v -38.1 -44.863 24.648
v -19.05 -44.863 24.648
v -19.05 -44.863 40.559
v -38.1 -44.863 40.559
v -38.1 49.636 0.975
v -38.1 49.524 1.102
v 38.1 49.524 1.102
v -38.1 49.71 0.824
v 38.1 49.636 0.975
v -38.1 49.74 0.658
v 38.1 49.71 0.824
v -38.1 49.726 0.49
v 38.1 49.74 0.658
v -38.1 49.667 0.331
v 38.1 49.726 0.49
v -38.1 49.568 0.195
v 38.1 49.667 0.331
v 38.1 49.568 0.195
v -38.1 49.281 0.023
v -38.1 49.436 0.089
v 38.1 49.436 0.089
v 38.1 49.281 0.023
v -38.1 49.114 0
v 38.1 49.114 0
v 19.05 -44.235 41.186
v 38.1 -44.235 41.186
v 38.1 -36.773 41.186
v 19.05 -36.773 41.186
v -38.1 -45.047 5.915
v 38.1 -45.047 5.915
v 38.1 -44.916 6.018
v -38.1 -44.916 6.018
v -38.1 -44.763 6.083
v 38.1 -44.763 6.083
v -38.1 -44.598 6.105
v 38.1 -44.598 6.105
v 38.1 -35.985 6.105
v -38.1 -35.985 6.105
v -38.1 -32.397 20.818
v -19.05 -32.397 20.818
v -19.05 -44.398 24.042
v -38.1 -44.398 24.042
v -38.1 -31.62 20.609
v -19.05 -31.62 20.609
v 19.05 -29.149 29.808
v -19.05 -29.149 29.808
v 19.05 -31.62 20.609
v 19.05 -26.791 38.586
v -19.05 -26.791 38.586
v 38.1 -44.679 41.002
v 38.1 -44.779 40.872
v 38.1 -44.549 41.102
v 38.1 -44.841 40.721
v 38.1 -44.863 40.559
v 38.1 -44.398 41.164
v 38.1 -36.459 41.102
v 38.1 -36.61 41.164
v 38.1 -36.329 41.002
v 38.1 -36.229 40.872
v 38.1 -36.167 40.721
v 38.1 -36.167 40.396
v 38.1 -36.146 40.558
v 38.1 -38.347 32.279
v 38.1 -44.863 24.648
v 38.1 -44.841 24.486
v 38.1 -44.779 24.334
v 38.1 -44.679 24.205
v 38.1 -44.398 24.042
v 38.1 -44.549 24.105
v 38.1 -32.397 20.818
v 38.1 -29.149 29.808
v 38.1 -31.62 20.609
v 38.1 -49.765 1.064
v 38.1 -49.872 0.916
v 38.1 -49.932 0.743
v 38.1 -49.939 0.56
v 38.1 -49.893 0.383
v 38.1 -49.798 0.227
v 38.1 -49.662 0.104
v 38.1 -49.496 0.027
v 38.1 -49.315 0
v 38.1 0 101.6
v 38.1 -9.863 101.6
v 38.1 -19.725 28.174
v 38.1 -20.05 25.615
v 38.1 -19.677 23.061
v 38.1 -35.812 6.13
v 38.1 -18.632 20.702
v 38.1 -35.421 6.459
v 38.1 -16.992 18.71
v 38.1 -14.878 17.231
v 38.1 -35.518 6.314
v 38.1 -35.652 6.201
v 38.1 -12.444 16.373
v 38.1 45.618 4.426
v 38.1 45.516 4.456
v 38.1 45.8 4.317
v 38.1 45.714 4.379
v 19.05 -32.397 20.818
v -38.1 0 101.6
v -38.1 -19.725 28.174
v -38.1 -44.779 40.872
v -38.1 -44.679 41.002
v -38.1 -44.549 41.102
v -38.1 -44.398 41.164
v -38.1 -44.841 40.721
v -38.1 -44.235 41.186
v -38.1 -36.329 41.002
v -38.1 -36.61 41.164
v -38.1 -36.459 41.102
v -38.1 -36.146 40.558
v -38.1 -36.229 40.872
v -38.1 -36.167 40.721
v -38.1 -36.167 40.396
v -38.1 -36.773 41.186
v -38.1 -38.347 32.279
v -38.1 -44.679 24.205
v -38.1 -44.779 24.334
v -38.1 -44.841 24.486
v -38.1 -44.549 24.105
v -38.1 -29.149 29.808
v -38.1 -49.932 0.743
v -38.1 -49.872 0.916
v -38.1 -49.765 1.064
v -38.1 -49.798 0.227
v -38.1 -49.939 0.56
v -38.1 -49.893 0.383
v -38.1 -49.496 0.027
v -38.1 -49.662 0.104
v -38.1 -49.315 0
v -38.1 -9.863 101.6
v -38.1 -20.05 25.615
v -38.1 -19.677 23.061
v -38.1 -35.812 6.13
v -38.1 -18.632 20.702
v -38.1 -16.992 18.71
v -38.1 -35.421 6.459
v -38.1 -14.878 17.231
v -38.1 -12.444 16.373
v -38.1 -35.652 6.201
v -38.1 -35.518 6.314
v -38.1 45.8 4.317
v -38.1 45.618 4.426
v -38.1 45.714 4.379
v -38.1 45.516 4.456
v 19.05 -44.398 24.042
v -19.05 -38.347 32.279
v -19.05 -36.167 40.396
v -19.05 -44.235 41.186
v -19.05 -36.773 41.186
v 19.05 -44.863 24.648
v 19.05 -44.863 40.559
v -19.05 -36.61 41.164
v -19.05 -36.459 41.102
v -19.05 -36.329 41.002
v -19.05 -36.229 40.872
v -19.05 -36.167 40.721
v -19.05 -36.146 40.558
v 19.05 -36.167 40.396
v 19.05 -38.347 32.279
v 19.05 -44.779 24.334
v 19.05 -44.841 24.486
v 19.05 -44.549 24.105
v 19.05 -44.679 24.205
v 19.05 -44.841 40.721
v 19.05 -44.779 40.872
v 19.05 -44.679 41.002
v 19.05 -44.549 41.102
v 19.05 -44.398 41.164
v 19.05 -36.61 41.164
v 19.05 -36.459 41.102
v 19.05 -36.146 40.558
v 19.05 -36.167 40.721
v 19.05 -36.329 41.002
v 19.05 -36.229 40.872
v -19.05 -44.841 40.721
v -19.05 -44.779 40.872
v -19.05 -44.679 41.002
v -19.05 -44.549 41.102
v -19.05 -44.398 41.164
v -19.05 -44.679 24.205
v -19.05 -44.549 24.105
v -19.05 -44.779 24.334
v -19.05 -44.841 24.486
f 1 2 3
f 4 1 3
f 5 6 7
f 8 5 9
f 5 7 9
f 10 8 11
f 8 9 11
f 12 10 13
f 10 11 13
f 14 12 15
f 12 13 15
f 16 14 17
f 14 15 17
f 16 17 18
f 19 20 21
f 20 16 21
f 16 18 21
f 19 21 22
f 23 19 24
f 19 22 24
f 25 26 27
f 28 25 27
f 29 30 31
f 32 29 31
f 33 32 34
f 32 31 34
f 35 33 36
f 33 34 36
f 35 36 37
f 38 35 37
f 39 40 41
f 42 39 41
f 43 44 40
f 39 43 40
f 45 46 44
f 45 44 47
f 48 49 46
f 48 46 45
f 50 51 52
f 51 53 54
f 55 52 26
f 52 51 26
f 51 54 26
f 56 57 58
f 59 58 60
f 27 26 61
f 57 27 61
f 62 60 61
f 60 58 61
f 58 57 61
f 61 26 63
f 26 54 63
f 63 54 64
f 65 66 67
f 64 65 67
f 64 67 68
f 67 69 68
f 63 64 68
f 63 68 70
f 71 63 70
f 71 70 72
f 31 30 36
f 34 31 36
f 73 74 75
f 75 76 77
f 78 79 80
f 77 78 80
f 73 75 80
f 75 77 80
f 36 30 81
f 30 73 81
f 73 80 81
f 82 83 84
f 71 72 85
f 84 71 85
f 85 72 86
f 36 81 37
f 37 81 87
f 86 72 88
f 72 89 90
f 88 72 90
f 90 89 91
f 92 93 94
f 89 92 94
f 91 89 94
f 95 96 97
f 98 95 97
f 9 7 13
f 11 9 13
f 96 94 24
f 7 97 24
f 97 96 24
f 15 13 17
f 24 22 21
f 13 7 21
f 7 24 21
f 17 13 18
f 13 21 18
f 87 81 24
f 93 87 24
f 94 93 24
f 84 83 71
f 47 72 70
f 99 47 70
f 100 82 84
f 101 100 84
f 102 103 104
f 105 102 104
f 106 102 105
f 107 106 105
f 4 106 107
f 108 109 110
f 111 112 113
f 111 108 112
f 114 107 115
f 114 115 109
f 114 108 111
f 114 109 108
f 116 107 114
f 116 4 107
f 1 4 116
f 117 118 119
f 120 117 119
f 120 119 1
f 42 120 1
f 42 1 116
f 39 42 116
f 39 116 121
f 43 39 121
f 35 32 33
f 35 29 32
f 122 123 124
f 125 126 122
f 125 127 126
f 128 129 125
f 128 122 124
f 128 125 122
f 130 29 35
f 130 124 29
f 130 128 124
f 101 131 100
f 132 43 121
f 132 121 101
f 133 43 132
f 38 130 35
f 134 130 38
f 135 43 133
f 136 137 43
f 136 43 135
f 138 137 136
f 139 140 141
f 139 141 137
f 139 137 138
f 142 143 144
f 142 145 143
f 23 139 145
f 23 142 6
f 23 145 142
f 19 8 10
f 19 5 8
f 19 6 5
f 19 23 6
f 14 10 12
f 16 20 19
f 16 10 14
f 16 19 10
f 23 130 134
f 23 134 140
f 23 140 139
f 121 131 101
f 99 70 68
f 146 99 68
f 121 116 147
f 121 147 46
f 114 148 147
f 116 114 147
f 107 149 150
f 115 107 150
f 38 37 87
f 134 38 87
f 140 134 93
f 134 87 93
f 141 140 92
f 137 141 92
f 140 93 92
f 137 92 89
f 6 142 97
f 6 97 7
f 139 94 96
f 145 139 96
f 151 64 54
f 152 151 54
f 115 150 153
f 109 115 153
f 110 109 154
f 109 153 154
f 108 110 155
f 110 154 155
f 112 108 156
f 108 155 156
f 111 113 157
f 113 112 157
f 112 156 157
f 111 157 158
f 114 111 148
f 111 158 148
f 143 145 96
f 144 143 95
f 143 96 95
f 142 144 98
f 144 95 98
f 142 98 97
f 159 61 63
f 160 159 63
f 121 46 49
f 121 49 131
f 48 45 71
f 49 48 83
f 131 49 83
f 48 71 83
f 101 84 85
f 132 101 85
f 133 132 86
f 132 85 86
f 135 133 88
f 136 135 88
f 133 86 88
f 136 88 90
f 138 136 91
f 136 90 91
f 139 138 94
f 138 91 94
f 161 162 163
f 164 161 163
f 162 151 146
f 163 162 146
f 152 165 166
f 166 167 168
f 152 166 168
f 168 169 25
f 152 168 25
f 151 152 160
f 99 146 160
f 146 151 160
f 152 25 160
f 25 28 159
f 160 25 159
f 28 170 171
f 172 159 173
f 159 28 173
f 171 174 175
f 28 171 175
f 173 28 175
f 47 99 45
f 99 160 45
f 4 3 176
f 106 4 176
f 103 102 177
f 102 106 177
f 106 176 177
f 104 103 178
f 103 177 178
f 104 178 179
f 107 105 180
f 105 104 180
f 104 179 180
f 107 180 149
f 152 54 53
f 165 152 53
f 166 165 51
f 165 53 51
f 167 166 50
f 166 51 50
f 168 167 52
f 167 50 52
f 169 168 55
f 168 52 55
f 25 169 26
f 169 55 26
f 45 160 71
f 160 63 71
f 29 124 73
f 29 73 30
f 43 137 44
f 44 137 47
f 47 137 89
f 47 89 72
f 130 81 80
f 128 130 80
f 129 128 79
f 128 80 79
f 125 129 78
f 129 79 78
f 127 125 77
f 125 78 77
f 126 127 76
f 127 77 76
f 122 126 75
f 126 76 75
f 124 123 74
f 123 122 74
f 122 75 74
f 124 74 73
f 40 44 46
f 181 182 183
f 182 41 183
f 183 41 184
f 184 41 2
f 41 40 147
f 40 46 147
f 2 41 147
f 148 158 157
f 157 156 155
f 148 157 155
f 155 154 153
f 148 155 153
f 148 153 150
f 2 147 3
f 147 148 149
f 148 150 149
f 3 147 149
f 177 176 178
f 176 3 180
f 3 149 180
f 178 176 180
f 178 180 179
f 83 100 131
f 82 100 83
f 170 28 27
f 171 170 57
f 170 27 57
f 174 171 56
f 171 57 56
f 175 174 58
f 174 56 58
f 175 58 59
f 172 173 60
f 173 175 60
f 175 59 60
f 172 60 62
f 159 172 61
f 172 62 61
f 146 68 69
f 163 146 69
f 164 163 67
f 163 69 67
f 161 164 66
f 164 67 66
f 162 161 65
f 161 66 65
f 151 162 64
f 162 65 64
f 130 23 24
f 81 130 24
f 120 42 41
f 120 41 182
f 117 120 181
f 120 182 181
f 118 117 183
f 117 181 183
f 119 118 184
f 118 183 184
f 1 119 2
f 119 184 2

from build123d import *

# Parameters (mm, degrees)
F0_W     = 76.2
F0_H     = 101.6
F1_DEPTH = 101.6
F3_DEPTH = 76.201
F4_W     = 38.1
F4_H     = 9.0885387092
F5_DEPTH = 25.4
F7_DEPTH = 19.05


with BuildPart() as f1:
    # F0 (on Top) → F1 (new body)
    with BuildSketch(Plane.XY):
        Rectangle(F0_W, F0_H)
    extrude(amount=F1_DEPTH)

    # F2 (on face) → F3 (cut, through all)
    with BuildSketch(Plane.YZ.offset(38.1)):
        with BuildLine():
            Line((50.8, 101.6), (0, 101.6))
            Line((0, 101.6), (-19.7247579018, 28.1743642605))
            ThreePointArc((-19.7247579018, 28.1743642605), (-18.6322824559, 20.7020087833), (-12.4441793676, 16.3733855441))
            Line((-12.4441793676, 16.3733855441), (45.5164201772, 4.4562514699))
            ThreePointArc((45.5164201772, 4.4562514699), (45.6671065402, 4.4046156558), (45.799921858, 4.316679721))
            Line((45.799921858, 4.316679721), (49.5238091926, 1.1017641769))
            ThreePointArc((49.5238091926, 1.1017641769), (49.7017678057, 0.4084810434), (49.114014449, 0))
            Line((49.114014449, 0), (50.8, 0))
            Line((50.8, 0), (50.8, 101.6))
        make_face()
        with BuildLine():
            Line((-29.1485272072, 29.8082903279), (-9.8627004197, 101.6))
            Line((-9.8627004197, 101.6), (-50.8, 101.6))
            Line((-50.8, 101.6), (-50.8, 0))
            Line((-50.8, 0), (-49.3153884285, 0))
            ThreePointArc((-49.3153884285, 0), (-49.8930613229, 0.38308634), (-49.7649416709, 1.0642959051))
            Line((-49.7649416709, 1.0642959051), (-45.0471924847, 5.9153086442))
            ThreePointArc((-45.0471924847, 5.9153086442), (-44.8416453701, 6.0557781013), (-44.5976392423, 6.1051976748))
            Line((-44.5976392423, 6.1051976748), (-35.9854393765, 6.1051976748))
            ThreePointArc((-35.9854393765, 6.1051976748), (-35.6522704088, 6.2010242938), (-35.4209251987, 6.4592174303))
            Line((-35.4209251987, 6.4592174303), (-31.6196714319, 20.6094278319))
            Line((-31.6196714319, 20.6094278319), (-32.3972816474, 20.8183218113))
            Line((-32.3972816474, 20.8183218113), (-44.3981189181, 24.042176905))
            ThreePointArc((-44.3981189181, 24.042176905), (-44.7330556249, 24.2662072787), (-44.8625199497, 24.6477976277))
            Line((-44.8625199497, 24.6477976277), (-44.8625199497, 40.5587139142))
            ThreePointArc((-44.8625199497, 40.5587139142), (-44.6788488183, 41.0021352507), (-44.2354274818, 41.1858063821))
            Line((-44.2354274818, 41.1858063821), (-36.772603948, 41.1858063821))
            ThreePointArc((-36.772603948, 41.1858063821), (-36.2749758049, 40.9403042633), (-36.1669832252, 40.396022478))
            Line((-36.1669832252, 40.396022478), (-38.3473897032, 32.2794345527))
            Line((-38.3473897032, 32.2794345527), (-29.1485272072, 29.8082903279))
        make_face()
    extrude(amount=-F3_DEPTH, mode=Mode.SUBTRACT)

    # F4 (on face) → F5 (cut)
    with BuildSketch(Plane(origin=(0, -34.6552022965, 9.3096296471), x_dir=(1, 0, 0), z_dir=(0, -0.9657598421, 0.2594377139))):
        with Locations((0, 25.7696918533)):
            Rectangle(F4_W, F4_H)
    extrude(amount=F5_DEPTH, mode=Mode.SUBTRACT)

    # F6 (on face) → F7 (cut)
    with BuildSketch(Plane(origin=(0, 5.5066750893, 20.4986606809), x_dir=(1, 0, 0), z_dir=(0, 0.2594377139, 0.9657598421))):
        Polygon((-19.05, -45.4088717305), (-19.05, -52.1549901364), (19.05, -52.1549901364), (19.05, -45.4088717305), (19.05, -35.8838717305), (-19.05, -35.8838717305), align=None)
    extrude(amount=-F7_DEPTH, mode=Mode.SUBTRACT)


solid = f1.part
